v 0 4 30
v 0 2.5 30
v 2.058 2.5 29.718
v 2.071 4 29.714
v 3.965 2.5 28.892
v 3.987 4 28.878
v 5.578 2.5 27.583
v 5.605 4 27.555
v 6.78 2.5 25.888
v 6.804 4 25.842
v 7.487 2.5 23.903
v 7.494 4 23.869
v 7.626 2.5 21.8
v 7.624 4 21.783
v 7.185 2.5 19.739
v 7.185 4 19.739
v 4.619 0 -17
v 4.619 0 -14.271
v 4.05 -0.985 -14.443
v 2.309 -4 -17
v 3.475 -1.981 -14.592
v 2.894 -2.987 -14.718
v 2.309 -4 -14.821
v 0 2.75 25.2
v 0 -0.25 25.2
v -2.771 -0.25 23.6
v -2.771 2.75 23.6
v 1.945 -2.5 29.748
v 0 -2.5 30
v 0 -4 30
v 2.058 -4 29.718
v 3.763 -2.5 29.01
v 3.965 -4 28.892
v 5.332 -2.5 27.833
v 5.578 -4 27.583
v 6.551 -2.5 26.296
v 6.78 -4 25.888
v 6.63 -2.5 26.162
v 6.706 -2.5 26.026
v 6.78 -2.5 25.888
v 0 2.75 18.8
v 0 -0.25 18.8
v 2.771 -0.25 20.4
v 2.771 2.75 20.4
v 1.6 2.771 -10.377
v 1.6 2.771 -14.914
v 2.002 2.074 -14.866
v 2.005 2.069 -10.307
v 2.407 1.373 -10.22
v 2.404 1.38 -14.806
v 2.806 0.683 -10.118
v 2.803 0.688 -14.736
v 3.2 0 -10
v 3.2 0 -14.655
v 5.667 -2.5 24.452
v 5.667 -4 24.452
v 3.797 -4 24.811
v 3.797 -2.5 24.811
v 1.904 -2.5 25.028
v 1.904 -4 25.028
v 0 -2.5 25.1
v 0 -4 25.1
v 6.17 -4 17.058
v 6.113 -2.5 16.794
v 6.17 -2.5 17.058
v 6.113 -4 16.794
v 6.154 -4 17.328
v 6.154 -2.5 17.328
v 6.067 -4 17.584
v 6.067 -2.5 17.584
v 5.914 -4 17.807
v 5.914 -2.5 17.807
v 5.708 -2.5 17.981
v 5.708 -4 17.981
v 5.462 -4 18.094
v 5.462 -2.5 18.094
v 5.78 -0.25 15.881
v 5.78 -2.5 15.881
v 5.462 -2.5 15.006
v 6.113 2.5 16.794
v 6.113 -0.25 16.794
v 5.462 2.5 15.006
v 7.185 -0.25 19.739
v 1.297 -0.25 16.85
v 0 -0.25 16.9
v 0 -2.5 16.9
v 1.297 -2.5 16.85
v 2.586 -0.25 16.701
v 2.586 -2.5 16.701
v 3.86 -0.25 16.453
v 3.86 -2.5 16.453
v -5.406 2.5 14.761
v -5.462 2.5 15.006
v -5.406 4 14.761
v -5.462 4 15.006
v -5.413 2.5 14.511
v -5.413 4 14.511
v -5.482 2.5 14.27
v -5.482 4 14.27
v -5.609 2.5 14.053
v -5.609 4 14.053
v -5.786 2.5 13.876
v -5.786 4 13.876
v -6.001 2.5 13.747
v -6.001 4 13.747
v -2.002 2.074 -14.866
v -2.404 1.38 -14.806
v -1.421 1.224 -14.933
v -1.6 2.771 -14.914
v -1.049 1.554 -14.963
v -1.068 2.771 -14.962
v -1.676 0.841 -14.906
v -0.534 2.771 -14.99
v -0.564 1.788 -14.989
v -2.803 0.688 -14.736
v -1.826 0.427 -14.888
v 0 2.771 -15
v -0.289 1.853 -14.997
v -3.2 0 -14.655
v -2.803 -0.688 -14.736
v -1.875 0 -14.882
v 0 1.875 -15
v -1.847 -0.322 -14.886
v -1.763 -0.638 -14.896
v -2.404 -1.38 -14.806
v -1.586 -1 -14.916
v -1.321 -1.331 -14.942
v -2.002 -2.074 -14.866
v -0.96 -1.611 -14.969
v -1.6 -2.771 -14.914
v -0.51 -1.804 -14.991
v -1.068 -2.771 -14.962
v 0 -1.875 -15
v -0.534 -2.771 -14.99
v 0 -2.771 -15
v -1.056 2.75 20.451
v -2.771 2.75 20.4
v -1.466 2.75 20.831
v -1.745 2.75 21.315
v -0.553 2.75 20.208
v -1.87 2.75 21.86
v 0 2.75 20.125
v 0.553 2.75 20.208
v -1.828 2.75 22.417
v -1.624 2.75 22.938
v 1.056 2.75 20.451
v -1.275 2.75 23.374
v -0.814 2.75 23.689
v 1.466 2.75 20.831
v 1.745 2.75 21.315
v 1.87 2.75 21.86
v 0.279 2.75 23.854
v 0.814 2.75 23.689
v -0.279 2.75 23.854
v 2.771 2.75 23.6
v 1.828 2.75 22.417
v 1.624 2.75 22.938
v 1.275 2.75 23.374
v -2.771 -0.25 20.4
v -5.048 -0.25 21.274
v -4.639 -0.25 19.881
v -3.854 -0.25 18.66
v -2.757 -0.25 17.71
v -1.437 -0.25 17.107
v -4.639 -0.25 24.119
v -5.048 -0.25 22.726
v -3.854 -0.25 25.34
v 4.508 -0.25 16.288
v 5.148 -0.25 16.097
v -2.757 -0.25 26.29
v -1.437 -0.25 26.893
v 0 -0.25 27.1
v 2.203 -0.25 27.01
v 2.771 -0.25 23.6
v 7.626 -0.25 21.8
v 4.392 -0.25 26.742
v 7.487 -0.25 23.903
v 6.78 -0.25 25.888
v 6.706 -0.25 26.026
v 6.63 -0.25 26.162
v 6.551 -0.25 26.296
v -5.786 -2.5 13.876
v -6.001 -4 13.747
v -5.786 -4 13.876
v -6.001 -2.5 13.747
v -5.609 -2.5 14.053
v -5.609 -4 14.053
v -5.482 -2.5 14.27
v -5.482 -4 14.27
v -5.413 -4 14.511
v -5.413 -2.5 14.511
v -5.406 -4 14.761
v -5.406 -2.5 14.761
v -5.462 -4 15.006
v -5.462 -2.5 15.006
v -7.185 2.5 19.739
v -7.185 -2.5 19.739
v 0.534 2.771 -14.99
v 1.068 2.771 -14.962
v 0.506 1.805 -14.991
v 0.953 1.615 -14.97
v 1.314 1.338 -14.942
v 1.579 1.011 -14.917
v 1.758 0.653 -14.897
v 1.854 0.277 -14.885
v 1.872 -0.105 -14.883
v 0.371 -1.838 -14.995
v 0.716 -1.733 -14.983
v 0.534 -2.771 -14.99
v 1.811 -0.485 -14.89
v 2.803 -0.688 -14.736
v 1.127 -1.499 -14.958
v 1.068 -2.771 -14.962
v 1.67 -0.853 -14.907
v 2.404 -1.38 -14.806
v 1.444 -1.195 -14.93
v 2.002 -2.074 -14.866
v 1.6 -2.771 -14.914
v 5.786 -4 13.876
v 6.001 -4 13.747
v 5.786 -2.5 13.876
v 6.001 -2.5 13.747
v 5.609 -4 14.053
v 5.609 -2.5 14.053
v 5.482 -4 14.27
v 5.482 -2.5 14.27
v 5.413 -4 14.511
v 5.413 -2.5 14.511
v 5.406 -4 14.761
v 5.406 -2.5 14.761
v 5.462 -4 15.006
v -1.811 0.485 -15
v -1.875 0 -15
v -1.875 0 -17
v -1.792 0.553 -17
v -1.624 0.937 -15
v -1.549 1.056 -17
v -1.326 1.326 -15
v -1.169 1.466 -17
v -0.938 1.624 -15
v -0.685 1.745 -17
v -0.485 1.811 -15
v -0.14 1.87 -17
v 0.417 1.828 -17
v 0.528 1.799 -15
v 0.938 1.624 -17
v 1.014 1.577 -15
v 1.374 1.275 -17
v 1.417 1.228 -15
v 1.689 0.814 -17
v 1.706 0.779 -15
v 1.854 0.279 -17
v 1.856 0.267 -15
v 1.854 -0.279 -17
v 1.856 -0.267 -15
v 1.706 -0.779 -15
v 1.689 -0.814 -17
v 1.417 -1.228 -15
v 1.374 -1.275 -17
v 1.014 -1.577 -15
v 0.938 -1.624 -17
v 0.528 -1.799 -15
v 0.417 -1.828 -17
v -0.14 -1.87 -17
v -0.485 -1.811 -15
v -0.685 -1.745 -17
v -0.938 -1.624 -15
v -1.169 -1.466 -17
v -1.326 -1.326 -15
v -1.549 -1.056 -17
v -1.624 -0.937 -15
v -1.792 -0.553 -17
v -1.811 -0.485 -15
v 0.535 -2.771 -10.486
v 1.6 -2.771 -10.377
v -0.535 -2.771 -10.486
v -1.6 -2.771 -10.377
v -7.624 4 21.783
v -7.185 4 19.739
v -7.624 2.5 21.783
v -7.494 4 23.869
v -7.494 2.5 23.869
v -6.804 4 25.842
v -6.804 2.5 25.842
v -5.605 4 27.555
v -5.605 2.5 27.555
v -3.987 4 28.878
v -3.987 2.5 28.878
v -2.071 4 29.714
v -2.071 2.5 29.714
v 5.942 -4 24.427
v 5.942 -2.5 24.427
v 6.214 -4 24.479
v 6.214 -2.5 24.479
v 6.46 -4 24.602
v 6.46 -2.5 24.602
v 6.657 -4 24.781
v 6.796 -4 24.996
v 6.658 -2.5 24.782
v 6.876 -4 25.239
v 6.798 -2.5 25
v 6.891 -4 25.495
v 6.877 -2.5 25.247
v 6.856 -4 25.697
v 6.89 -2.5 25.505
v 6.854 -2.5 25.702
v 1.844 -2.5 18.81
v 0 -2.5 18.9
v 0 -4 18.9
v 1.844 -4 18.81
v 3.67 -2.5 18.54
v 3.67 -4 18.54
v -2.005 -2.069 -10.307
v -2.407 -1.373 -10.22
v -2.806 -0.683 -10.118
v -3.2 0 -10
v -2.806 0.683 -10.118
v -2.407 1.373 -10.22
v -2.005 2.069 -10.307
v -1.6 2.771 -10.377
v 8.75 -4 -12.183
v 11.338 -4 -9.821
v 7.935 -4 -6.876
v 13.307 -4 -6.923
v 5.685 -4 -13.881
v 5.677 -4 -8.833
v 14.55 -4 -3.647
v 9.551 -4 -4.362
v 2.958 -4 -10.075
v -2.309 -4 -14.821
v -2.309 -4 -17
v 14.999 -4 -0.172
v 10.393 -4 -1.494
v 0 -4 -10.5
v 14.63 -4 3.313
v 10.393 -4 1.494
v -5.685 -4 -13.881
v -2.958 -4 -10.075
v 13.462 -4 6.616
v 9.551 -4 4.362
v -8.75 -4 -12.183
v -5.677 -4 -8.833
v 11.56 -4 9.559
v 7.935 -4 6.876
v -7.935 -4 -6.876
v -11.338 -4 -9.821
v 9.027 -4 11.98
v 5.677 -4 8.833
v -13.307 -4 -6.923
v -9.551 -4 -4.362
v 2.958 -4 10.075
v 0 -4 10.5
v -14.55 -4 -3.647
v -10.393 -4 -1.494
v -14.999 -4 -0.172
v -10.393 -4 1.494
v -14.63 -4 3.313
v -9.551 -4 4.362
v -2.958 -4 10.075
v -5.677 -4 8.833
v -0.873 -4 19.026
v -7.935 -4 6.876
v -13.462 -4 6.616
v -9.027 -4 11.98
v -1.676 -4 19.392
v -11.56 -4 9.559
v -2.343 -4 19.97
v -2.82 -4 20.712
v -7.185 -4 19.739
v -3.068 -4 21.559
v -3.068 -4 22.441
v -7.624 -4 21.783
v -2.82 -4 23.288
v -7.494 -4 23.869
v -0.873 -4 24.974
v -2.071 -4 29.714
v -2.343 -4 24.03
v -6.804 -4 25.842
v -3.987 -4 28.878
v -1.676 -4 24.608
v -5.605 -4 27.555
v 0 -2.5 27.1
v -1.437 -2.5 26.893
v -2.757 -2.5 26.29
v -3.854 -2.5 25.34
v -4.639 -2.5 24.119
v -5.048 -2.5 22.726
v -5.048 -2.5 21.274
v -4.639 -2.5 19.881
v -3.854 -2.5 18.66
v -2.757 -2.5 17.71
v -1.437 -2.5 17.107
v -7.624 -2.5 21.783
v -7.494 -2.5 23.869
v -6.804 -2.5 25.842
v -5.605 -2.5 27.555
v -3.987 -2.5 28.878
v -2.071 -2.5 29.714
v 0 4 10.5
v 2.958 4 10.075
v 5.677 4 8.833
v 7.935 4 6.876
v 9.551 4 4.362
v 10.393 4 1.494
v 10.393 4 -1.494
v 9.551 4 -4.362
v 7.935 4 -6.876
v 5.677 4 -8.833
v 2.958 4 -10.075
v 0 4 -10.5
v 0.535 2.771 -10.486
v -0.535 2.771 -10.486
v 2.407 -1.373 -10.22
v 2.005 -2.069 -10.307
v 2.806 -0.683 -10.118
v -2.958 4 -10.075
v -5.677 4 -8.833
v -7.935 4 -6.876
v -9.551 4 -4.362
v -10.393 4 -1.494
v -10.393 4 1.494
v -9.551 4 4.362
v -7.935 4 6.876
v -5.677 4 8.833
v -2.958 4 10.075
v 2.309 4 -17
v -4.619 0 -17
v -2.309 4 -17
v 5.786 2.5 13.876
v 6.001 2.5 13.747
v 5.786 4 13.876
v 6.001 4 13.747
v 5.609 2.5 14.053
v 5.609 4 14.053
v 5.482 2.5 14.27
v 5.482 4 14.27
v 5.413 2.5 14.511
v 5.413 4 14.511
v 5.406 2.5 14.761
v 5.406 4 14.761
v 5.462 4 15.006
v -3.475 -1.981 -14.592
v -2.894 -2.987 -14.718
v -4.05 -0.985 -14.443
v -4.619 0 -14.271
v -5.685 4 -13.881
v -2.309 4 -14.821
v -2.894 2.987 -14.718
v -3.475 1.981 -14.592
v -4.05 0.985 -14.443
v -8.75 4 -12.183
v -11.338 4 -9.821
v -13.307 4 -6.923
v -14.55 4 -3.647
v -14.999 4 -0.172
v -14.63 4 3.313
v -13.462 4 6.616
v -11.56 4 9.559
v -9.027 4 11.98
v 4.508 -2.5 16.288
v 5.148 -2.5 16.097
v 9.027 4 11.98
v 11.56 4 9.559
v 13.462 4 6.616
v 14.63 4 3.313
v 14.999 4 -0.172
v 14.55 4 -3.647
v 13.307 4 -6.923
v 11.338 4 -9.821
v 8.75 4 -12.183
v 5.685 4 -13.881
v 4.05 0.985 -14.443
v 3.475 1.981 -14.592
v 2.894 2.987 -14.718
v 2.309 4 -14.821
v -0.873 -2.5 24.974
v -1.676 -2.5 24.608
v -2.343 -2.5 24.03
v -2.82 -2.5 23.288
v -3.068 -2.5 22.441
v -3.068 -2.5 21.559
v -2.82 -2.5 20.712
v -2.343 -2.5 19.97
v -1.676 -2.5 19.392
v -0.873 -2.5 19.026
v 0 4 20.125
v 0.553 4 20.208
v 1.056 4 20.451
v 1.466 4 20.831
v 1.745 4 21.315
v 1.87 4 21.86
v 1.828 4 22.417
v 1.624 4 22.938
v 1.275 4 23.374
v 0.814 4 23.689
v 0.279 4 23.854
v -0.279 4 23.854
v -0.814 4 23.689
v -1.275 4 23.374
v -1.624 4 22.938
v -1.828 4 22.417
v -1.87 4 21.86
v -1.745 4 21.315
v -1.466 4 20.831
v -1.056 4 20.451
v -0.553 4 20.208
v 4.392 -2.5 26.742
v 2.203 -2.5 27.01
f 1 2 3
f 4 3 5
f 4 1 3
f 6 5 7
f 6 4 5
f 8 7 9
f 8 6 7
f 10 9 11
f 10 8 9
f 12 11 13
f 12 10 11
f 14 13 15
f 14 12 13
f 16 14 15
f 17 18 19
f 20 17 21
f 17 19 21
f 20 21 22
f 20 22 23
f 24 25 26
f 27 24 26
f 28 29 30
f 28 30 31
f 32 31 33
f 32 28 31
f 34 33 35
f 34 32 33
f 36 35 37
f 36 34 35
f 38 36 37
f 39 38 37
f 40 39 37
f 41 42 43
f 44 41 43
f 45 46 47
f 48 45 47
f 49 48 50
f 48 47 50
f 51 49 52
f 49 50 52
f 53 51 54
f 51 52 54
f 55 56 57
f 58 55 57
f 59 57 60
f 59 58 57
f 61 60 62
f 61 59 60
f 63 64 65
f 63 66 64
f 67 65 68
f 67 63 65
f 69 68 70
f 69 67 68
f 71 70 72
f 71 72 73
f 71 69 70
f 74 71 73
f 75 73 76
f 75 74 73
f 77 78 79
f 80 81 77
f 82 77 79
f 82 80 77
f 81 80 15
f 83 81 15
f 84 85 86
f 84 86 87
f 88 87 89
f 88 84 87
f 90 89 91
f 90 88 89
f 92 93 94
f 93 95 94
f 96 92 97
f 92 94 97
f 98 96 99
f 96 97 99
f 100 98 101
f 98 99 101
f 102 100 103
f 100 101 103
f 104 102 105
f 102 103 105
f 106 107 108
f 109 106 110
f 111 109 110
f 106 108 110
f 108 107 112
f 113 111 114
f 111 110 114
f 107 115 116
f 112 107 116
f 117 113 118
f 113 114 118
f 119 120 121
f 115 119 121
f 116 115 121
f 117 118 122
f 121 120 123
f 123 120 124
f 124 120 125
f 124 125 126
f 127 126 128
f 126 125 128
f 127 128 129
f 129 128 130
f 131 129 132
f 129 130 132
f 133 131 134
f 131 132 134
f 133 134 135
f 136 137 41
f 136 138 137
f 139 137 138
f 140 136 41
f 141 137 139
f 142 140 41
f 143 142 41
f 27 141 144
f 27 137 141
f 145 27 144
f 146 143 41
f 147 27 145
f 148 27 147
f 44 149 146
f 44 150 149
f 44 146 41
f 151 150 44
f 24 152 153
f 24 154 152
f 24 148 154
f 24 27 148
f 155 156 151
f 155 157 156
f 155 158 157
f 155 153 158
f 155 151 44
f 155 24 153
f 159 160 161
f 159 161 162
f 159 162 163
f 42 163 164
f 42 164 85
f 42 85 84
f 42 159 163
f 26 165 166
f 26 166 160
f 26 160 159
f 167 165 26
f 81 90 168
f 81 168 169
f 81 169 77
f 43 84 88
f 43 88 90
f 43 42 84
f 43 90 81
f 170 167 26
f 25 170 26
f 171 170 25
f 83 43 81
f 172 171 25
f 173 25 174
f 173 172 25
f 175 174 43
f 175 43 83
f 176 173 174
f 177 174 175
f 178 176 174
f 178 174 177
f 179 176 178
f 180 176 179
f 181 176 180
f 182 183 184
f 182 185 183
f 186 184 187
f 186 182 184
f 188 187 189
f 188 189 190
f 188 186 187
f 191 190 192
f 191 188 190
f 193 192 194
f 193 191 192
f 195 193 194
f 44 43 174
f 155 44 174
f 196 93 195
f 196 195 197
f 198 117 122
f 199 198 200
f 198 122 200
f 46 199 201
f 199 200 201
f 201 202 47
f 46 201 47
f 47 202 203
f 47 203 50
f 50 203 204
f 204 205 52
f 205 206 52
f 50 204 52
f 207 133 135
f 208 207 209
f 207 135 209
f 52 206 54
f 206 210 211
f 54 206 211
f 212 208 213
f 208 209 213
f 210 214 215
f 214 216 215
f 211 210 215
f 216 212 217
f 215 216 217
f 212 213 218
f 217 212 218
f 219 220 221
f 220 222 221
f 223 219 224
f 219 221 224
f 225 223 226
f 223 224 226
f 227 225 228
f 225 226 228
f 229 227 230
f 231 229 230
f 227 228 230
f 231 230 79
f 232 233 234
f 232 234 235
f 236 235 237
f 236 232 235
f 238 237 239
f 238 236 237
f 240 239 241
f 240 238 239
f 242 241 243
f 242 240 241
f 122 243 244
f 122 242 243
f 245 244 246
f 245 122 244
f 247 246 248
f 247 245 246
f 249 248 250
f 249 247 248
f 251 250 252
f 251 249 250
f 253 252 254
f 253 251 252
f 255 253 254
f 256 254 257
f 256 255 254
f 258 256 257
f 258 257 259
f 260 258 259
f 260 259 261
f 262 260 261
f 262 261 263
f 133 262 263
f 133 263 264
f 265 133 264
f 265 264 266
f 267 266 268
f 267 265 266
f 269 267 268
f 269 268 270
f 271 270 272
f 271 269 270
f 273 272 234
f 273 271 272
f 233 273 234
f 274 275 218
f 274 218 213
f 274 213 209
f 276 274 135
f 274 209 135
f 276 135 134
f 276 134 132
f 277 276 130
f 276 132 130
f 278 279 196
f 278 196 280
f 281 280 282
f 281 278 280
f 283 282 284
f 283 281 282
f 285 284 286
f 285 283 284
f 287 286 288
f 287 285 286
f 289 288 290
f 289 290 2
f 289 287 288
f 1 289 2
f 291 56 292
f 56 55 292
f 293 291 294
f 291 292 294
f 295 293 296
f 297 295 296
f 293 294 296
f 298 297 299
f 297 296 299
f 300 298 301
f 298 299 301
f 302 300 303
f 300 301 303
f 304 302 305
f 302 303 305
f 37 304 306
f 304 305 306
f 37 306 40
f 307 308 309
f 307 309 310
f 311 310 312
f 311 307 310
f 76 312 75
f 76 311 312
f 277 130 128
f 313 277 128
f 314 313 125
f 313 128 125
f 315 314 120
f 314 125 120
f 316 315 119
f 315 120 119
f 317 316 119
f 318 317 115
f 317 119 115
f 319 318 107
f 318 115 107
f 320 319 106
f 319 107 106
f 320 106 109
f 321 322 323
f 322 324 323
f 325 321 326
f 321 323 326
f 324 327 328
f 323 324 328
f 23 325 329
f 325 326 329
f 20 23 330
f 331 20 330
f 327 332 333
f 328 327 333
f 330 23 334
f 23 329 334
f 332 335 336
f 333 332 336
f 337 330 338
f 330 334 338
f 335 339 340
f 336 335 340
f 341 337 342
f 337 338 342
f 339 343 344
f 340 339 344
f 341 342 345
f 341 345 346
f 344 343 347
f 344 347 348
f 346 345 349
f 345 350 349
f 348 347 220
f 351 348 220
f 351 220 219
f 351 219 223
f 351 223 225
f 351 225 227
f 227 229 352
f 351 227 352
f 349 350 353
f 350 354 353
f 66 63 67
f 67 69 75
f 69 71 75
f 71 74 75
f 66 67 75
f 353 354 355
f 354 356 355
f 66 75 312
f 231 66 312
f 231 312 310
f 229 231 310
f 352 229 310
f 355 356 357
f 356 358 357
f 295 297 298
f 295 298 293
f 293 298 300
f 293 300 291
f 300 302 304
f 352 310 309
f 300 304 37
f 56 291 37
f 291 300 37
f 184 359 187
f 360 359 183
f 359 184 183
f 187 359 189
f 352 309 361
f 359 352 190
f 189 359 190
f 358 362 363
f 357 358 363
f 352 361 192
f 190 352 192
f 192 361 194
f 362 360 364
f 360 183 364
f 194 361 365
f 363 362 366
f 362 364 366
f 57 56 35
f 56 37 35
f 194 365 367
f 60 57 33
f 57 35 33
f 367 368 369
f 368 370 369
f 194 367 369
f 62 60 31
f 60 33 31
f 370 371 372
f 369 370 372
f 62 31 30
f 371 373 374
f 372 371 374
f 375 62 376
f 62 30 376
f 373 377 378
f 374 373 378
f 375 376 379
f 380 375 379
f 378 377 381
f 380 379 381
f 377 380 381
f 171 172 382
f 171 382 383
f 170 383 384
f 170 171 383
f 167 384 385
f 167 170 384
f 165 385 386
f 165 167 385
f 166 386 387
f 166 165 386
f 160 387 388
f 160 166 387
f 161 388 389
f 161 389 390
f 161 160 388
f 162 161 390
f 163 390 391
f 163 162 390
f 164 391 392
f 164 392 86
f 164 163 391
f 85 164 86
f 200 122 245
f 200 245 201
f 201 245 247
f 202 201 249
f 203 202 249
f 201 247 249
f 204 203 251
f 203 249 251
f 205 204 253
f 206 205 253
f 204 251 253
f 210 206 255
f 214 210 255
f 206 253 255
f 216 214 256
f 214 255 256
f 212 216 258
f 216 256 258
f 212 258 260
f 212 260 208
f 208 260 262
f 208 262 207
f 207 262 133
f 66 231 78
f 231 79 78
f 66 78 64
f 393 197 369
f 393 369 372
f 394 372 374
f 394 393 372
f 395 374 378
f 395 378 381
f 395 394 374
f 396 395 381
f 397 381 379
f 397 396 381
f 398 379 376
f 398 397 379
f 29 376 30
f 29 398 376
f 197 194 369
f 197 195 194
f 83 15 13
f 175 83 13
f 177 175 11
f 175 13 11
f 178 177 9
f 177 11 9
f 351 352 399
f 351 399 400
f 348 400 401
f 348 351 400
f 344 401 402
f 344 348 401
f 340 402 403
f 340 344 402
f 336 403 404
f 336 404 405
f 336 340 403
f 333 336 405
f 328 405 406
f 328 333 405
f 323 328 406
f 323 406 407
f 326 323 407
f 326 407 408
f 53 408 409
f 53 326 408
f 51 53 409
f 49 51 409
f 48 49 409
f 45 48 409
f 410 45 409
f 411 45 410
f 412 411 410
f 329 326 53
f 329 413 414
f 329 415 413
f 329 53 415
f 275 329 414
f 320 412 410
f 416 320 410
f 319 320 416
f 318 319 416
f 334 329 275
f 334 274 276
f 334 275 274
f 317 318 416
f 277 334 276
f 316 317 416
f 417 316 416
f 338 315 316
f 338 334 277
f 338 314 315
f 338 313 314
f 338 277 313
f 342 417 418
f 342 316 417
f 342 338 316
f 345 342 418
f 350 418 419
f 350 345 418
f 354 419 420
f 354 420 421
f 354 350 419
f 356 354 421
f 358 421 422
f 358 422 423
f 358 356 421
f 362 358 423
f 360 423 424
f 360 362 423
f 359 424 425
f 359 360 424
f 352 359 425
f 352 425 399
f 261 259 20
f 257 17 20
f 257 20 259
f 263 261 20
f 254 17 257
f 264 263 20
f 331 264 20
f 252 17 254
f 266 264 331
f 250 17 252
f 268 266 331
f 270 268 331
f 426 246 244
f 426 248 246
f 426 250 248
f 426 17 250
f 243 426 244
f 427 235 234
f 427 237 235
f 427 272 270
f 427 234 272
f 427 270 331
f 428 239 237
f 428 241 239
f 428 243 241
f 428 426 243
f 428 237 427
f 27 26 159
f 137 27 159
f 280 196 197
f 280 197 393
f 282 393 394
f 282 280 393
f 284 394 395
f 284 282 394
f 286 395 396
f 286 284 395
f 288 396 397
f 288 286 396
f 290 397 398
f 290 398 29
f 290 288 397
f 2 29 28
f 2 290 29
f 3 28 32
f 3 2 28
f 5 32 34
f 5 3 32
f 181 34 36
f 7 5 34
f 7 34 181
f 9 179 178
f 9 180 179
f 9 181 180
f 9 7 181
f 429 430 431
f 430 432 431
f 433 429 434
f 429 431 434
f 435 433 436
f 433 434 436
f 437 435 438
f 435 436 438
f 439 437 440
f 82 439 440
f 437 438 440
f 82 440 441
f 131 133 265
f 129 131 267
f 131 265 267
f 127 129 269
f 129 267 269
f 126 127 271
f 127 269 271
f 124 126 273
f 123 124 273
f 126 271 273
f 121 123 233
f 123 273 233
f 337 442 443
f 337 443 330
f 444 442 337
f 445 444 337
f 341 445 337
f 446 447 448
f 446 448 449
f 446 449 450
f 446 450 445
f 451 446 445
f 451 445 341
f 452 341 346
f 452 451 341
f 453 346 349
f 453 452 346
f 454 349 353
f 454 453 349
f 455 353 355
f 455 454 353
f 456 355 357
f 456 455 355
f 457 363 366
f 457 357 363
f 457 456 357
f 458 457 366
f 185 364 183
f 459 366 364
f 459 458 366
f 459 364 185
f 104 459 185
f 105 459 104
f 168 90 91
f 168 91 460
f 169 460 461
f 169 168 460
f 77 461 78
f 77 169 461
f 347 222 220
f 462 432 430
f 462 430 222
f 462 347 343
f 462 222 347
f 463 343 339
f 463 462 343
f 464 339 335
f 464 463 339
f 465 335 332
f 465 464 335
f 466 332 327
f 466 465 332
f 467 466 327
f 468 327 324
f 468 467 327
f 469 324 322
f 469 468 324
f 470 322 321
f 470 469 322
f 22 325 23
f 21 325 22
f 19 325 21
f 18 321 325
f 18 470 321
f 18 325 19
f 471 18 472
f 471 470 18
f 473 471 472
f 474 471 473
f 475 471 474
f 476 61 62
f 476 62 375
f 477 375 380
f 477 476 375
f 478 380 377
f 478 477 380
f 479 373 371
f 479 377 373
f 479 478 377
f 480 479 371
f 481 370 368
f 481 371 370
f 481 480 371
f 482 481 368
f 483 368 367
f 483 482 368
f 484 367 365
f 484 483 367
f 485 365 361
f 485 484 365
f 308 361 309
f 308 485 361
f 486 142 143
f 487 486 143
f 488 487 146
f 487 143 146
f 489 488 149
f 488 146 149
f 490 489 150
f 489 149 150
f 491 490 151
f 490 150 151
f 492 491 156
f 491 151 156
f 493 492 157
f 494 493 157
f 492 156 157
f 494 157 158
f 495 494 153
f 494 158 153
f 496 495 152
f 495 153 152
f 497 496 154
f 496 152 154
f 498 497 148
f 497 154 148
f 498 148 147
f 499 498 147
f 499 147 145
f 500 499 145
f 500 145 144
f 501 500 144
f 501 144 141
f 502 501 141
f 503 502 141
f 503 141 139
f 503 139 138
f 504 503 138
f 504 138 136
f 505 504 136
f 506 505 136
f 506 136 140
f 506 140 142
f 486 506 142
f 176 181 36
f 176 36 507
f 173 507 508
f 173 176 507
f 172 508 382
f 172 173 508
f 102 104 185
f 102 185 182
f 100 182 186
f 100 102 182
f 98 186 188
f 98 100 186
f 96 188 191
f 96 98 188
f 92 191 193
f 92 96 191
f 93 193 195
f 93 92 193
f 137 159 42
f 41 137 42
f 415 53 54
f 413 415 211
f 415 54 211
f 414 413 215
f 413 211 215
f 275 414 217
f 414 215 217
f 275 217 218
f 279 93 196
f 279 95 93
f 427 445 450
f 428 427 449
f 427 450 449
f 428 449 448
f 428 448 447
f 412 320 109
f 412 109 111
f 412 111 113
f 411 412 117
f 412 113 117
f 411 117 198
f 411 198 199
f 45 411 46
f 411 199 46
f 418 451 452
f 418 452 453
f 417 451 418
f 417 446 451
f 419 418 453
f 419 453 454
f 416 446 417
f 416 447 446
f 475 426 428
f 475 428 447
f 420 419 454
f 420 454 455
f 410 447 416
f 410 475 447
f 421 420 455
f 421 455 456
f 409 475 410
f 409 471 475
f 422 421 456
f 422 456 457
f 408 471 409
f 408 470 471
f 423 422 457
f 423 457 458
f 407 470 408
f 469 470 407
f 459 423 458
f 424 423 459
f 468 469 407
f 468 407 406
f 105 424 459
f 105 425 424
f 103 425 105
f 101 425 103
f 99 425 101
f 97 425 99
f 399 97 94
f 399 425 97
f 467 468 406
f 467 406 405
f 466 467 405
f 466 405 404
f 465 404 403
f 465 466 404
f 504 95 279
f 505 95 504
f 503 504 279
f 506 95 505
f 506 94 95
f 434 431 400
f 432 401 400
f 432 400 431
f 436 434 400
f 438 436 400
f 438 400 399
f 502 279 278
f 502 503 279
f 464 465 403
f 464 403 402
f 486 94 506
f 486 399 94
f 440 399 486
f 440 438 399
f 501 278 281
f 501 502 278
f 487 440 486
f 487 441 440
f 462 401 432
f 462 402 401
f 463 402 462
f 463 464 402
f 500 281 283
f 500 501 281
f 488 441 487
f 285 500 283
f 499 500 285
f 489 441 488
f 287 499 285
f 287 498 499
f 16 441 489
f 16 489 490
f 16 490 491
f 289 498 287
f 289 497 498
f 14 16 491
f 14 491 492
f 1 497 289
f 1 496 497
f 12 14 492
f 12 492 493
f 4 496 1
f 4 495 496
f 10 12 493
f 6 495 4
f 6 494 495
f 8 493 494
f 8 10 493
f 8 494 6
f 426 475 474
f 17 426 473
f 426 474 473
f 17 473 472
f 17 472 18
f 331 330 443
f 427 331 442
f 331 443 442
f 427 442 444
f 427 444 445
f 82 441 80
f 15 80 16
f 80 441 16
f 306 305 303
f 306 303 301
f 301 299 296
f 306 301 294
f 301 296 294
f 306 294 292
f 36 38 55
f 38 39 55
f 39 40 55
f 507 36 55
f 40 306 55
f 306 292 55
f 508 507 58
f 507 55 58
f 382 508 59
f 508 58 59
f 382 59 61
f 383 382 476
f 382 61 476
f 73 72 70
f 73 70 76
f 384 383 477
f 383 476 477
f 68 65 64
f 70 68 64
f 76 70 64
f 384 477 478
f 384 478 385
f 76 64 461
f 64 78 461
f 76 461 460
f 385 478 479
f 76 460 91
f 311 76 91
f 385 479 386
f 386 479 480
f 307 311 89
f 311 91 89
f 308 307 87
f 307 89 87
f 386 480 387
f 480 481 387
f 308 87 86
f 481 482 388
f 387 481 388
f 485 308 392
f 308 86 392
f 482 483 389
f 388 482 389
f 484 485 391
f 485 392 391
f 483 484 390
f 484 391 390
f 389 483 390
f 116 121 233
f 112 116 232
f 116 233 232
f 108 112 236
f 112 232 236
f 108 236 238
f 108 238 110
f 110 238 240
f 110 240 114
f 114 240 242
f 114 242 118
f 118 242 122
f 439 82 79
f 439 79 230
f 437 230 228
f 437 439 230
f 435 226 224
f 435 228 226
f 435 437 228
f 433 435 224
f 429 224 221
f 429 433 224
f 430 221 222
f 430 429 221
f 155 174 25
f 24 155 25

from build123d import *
from build123d.topology import SkipClean

# Parameters (mm, degrees)
CROQUIS1_R                          = 15
CROQUIS1_R_2                        = 10.5
SALIENTE_EXTRUIR1_DEPTH             = 4
CROQUIS2_R                          = 1.875
CORTAR_EXTRUIR1_DEPTH               = 8
SALIENTE_EXTRUIR2_REACH             = 35.779
SALIENTE_EXTRUIR2_END_RADIUS        = 15
CROQUIS2_4_R                        = 1.875
SALIENTE_EXTRUIR2_DIRECTION_2_DEPTH = 2
REVOLUCI_N1_ANGLE                   = 20
REVOLUCI_N1_OTHER_WAY_ANGLE         = 20
CORTAR_EXTRUIR6_DEPTH               = 35.481879299
CORTAR_EXTRUIR6_DEPTH_BACK          = 3
CROQUIS4_3_R                        = 1.875
CORTAR_EXTRUIR7_DEPTH               = 35.481879299
CORTAR_EXTRUIR8_START               = -8
CORTAR_EXTRUIR8_DEPTH               = 8
REDONDEO3_R                         = 1
SALIENTE_EXTRUIR3_START             = 5
SALIENTE_EXTRUIR3_DEPTH             = 5
CORTAR_EXTRUIR9_DEPTH               = 1.75
CORTAR_EXTRUIR9_DEPTH_BACK          = 0.5
SALIENTE_EXTRUIR4_OUTLINE_R         = 1.875
SALIENTE_EXTRUIR4_DEPTH             = 2.75
CORTAR_EXTRUIR10_DEPTH              = 3


# Read off the part's stored shape, not the designer's step: Cortar-Extruir8, Saliente-Extruir4
with BuildPart() as part:
    # Croquis1 → Saliente-Extruir1 (new, symmetric)
    with BuildSketch(Plane(origin=(0, 0, 0), x_dir=(1, 0, 0), z_dir=(0, 1, 0))):
        with Locations(Location((0, 0, 0), (0, 0, 270))):
            Circle(CROQUIS1_R)
        with Locations(Location((0, 0, 0), (0, 0, 270))):
            Circle(CROQUIS1_R_2, mode=Mode.SUBTRACT)
    extrude(amount=SALIENTE_EXTRUIR1_DEPTH, both=True)

    # Croquis2 → Cortar-Extruir1 (cut)
    with BuildSketch(Plane(origin=(0, 0, -15), x_dir=(-1, 0, 0), z_dir=(0, 0, -1))):
        Polygon((-3.2, 0), (-1.6, -2.771281292), (1.6, -2.771281292), (3.2, 0), (1.6, 2.771281292), (-1.6, 2.771281292), align=None)
        Circle(CROQUIS2_R)
    extrude(amount=-CORTAR_EXTRUIR1_DEPTH, mode=Mode.SUBTRACT)

    # Saliente-Extruir2: up to this cylinder (the profile starts outside it)
    with SkipClean():  # the faces are left unmerged after this step: merging them gives an invalid solid
        saliente_extruir2_end = Plane(origin=(0, -1.641104, 0), z_dir=(0, -1, 0)) * Cylinder(SALIENTE_EXTRUIR2_END_RADIUS, 103.15359, mode=Mode.PRIVATE)
        # Croquis2<4> → Saliente-Extruir2 (add, up to the surface)
        with BuildSketch(Plane(origin=(0, 0, -15), x_dir=(-1, 0, 0), z_dir=(0, 0, -1)), mode=Mode.PRIVATE) as saliente_extruir2_sk1:
            Polygon((-4.618802154, 0), (-2.309401077, -4), (2.309401077, -4), (4.618802154, 0), (2.309401077, 4), (-2.309401077, 4), align=None)
            Polygon((-1.6, -2.771281292), (1.6, -2.771281292), (3.2, 0), (1.6, 2.771281292), (-1.6, 2.771281292), (-3.2, 0), align=None, mode=Mode.SUBTRACT)
        saliente_extruir2_tool1 = extrude(saliente_extruir2_sk1.sketch, amount=-SALIENTE_EXTRUIR2_REACH, mode=Mode.PRIVATE) - saliente_extruir2_end
        add(saliente_extruir2_tool1.solids().sort_by_distance((3.358272, -1.938899, -15))[0])
        add(saliente_extruir2_tool1.solids().sort_by_distance((3.358272, -1.938899, -15))[1])
        # Croquis2<4> → Saliente-Extruir2 (add, up to the surface)
        with BuildSketch(Plane(origin=(0, 0, -15), x_dir=(-1, 0, 0), z_dir=(0, 0, -1)), mode=Mode.PRIVATE) as saliente_extruir2_sk2:
            Polygon((-3.2, 0), (-1.6, -2.771281292), (1.6, -2.771281292), (3.2, 0), (1.6, 2.771281292), (-1.6, 2.771281292), align=None)
            Circle(CROQUIS2_4_R, mode=Mode.SUBTRACT)
        saliente_extruir2_tool2 = extrude(saliente_extruir2_sk2.sketch, amount=-SALIENTE_EXTRUIR2_REACH, mode=Mode.PRIVATE) - saliente_extruir2_end
        add(saliente_extruir2_tool2.solids().sort_by_distance((2.326679, -1.343309, -15))[0])
        add(saliente_extruir2_tool2.solids().sort_by_distance((2.326679, -1.343309, -15))[1])

    # Croquis2<4> → Saliente-Extruir2 direction 2 (add)
    # profile 1 of 2: a face of its own
    with BuildSketch(Plane(origin=(0, 0, -15), x_dir=(-1, 0, 0), z_dir=(0, 0, -1))):
        Polygon((-4.618802154, 0), (-2.309401077, -4), (2.309401077, -4), (4.618802154, 0), (2.309401077, 4), (-2.309401077, 4), align=None)
        Polygon((-1.6, -2.771281292), (1.6, -2.771281292), (3.2, 0), (1.6, 2.771281292), (-1.6, 2.771281292), (-3.2, 0), align=None, mode=Mode.SUBTRACT)
    # profile 2 of 2: a face of its own
    with BuildSketch(Plane(origin=(0, 0, -15), x_dir=(-1, 0, 0), z_dir=(0, 0, -1))):
        Polygon((-3.2, 0), (-1.6, -2.771281292), (1.6, -2.771281292), (3.2, 0), (1.6, 2.771281292), (-1.6, 2.771281292), align=None)
        Circle(CROQUIS2_4_R, mode=Mode.SUBTRACT)
    extrude(amount=SALIENTE_EXTRUIR2_DIRECTION_2_DEPTH)

    # Croquis3 → Revolución1 (revolve)
    with BuildSketch(Plane(origin=(0, 0, 0), x_dir=(0, 0, -1), z_dir=(1, 0, 0))):
        Polygon((-30, 4), (-14, 4), (-14, -4), (-30, -4), (-30, -2.5), (-15, -2.5), (-15, 2.5), (-30, 2.5), align=None)
    revolve(axis=Axis((0, 4, 0), (0, -1, 0)), revolution_arc=REVOLUCI_N1_ANGLE)

    # Croquis3 → Revolución1 other way (revolve)
    with BuildSketch(Plane(origin=(0, 0, 0), x_dir=(0, 0, -1), z_dir=(1, 0, 0))):
        Polygon((-30, 4), (-14, 4), (-14, -4), (-30, -4), (-30, -2.5), (-15, -2.5), (-15, 2.5), (-30, 2.5), align=None)
    revolve(axis=Axis((0, 4, 0), (0, 1, 0)), revolution_arc=REVOLUCI_N1_OTHER_WAY_ANGLE)

    # Croquis4 → Cortar-Extruir6 (cut, two sides: drawn at the far end of the back side and taken through both)
    with BuildSketch(Plane.XZ.offset(4).offset(-CORTAR_EXTRUIR6_DEPTH_BACK)):
        with BuildLine():
            ThreePointArc((8.584705597, 23.586284782), (4.358569265, 24.7186746), (1.2e-08, 25.1))
            ThreePointArc((1.2e-08, 25.1), (-3.1, 22.000000006), (0, 18.9))
            ThreePointArc((0, 18.9), (3.281950558, 18.612866532), (6.464180709, 17.760190533))
            Line((6.464180709, 17.760190533), (8.584705597, 23.586284782))
        make_face()
    extrude(amount=CORTAR_EXTRUIR6_DEPTH + CORTAR_EXTRUIR6_DEPTH_BACK, mode=Mode.SUBTRACT)

    # Croquis4<3> → Cortar-Extruir7 (cut, through all)
    with BuildSketch(Plane.XZ.offset(4)):
        with Locations(Location((0, 22, 0), (0, 0, 270))):
            Circle(CROQUIS4_3_R)
    extrude(amount=-CORTAR_EXTRUIR7_DEPTH, mode=Mode.SUBTRACT)

    # Cortar-Extruir8 outline → Cortar-Extruir8 (cut)
    with BuildSketch(Plane.XZ.offset(4).offset(CORTAR_EXTRUIR8_START)):
        with BuildLine():
            ThreePointArc((-7.184552477, 19.7393957), (-6.262942497, 26.739718497), (1e-09, 30))
            ThreePointArc((1e-09, 30), (-5.20944533, 29.544232591), (-10.2606043, 28.190778624))
            Line((-10.2606043, 28.190778624), (-7.184552477, 19.7393957))
        make_face()
        with BuildLine():
            Line((7.184552477, 19.7393957), (8.584705598, 23.586284782))
            Line((8.584705598, 23.586284782), (10.2606043, 28.190778624))
            ThreePointArc((10.2606043, 28.190778624), (5.209445331, 29.54423259), (1e-09, 30))
            ThreePointArc((1e-09, 30), (6.262942498, 26.739718496), (7.184552477, 19.7393957))
        make_face()
    extrude(amount=CORTAR_EXTRUIR8_DEPTH, mode=Mode.SUBTRACT)

    # Redondeo3
    redondeo3_edges = [part.edges().sort_by_distance(p)[0] for p in [
        (6.464180709, -3.25, 17.760190533),
        (7.474898271, -3.25, 23.961133025),
        (-5.13030215, 3.25, 14.095389312),
        (-5.13030215, -3.25, 14.095389312),
        (5.13030215, 3.25, 14.095389312),
        (5.13030215, -3.25, 14.095389312),
    ]]
    fillet(redondeo3_edges, radius=REDONDEO3_R)

    # Croquis9 → Saliente-Extruir3 (add)
    with BuildSketch(Plane(origin=(0, -2.5, 0), x_dir=(1, 0, 0), z_dir=(0, 1, 0)).offset(SALIENTE_EXTRUIR3_START)):
        with BuildLine():
            Line((6.112599464, -16.794229002), (5.461623706, -15.005687805))
            ThreePointArc((5.461623706, -15.005687805), (5.482238333, -14.26959198), (6.001234056, -13.747188433))
            ThreePointArc((6.001234056, -13.747188433), (0, -15), (-6.001234056, -13.747188433))
            ThreePointArc((-6.001234056, -13.747188433), (-5.482238333, -14.26959198), (-5.461623706, -15.005687805))
            Line((-5.461623706, -15.005687805), (-7.184552477, -19.7393957))
            ThreePointArc((-7.184552477, -19.7393957), (-3.08103884, -29.351717504), (6.779967306, -25.888177056))
            ThreePointArc((6.779967306, -25.888177056), (6.683772805, -24.813619231), (5.667398999, -24.451801336))
            ThreePointArc((5.667398999, -24.451801336), (2.852173422, -24.93742382), (0, -25.1))
            ThreePointArc((0, -25.1), (-3.1, -22), (0, -18.9))
            ThreePointArc((0, -18.9), (2.760553354, -18.697308501), (5.461896053, -18.0935815))
            ThreePointArc((5.461896053, -18.0935815), (6.067051121, -17.584028122), (6.112599464, -16.794229002))
        make_face()
    extrude(amount=-SALIENTE_EXTRUIR3_DEPTH)

    # Croquis10 → Cortar-Extruir9 (cut, two sides: drawn at the far end of the back side and taken through both)
    with BuildSketch(Plane(origin=(0, -0.75, 0), x_dir=(-1, 0, 0), z_dir=(0, -1, 0)).offset(-CORTAR_EXTRUIR9_DEPTH_BACK)):
        with BuildLine():
            ThreePointArc((-6.779967306, -25.888177056), (-6.668671988, -26.09396334), (-6.551132513, -26.296248074))
            ThreePointArc((-6.551132513, -26.296248074), (-3.300127057, -26.898311497), (0, -27.1))
            ThreePointArc((0, -27.1), (5.1, -22), (0, -16.9))
            ThreePointArc((0, -16.9), (-1.942951583, -16.787940289), (-3.860136706, -16.453247236))
            ThreePointArc((-3.860136706, -16.453247236), (-4.828629021, -16.195503752), (-5.780140422, -15.880805291))
            Line((-5.780140422, -15.880805291), (-6.112599464, -16.794229002))
            ThreePointArc((-6.112599464, -16.794229002), (-6.067051121, -17.584028122), (-5.461896053, -18.0935815))
            ThreePointArc((-5.461896053, -18.0935815), (-2.760553354, -18.697308501), (0, -18.9))
            ThreePointArc((0, -18.9), (3.1, -22), (0, -25.1))
            ThreePointArc((0, -25.1), (-2.852173422, -24.93742382), (-5.667398999, -24.451801336))
            ThreePointArc((-5.667398999, -24.451801336), (-6.683772805, -24.813619231), (-6.779967306, -25.888177056))
        make_face()
    extrude(amount=CORTAR_EXTRUIR9_DEPTH + CORTAR_EXTRUIR9_DEPTH_BACK, mode=Mode.SUBTRACT)

    # Saliente-Extruir4 outline → Saliente-Extruir4 (add)
    with BuildSketch(Plane.XZ.offset(-2.5)):
        with BuildLine():
            ThreePointArc((5.461896053, 18.0935815), (6.067051121, 17.584028122), (6.112599464, 16.794229002))
            Line((6.112599464, 16.794229002), (7.184552477, 19.7393957))
            ThreePointArc((7.184552477, 19.7393957), (7.629143545, 22.856350834), (6.779967306, 25.888177056))
            ThreePointArc((6.779967306, 25.888177056), (6.683772805, 24.813619231), (5.667398999, 24.451801336))
            ThreePointArc((5.667398999, 24.451801336), (2.852173422, 24.93742382), (0, 25.1))
            ThreePointArc((0, 25.1), (-3.1, 22), (0, 18.9))
            ThreePointArc((0, 18.9), (2.760553354, 18.697308501), (5.461896053, 18.0935815))
        make_face()
        with Locations((0, 22)):
            Circle(SALIENTE_EXTRUIR4_OUTLINE_R, mode=Mode.SUBTRACT)
    extrude(amount=SALIENTE_EXTRUIR4_DEPTH)

    # Croquis12 → Cortar-Extruir10 (cut)
    with BuildSketch(Plane.XZ.offset(0.25)):
        Polygon((-2.771281292, 23.6), (-2.771281292, 20.4), (0, 18.8), (2.771281292, 20.4), (2.771281292, 23.6), (0, 25.2), align=None)
    extrude(amount=-CORTAR_EXTRUIR10_DEPTH, mode=Mode.SUBTRACT)


solid = part.part
